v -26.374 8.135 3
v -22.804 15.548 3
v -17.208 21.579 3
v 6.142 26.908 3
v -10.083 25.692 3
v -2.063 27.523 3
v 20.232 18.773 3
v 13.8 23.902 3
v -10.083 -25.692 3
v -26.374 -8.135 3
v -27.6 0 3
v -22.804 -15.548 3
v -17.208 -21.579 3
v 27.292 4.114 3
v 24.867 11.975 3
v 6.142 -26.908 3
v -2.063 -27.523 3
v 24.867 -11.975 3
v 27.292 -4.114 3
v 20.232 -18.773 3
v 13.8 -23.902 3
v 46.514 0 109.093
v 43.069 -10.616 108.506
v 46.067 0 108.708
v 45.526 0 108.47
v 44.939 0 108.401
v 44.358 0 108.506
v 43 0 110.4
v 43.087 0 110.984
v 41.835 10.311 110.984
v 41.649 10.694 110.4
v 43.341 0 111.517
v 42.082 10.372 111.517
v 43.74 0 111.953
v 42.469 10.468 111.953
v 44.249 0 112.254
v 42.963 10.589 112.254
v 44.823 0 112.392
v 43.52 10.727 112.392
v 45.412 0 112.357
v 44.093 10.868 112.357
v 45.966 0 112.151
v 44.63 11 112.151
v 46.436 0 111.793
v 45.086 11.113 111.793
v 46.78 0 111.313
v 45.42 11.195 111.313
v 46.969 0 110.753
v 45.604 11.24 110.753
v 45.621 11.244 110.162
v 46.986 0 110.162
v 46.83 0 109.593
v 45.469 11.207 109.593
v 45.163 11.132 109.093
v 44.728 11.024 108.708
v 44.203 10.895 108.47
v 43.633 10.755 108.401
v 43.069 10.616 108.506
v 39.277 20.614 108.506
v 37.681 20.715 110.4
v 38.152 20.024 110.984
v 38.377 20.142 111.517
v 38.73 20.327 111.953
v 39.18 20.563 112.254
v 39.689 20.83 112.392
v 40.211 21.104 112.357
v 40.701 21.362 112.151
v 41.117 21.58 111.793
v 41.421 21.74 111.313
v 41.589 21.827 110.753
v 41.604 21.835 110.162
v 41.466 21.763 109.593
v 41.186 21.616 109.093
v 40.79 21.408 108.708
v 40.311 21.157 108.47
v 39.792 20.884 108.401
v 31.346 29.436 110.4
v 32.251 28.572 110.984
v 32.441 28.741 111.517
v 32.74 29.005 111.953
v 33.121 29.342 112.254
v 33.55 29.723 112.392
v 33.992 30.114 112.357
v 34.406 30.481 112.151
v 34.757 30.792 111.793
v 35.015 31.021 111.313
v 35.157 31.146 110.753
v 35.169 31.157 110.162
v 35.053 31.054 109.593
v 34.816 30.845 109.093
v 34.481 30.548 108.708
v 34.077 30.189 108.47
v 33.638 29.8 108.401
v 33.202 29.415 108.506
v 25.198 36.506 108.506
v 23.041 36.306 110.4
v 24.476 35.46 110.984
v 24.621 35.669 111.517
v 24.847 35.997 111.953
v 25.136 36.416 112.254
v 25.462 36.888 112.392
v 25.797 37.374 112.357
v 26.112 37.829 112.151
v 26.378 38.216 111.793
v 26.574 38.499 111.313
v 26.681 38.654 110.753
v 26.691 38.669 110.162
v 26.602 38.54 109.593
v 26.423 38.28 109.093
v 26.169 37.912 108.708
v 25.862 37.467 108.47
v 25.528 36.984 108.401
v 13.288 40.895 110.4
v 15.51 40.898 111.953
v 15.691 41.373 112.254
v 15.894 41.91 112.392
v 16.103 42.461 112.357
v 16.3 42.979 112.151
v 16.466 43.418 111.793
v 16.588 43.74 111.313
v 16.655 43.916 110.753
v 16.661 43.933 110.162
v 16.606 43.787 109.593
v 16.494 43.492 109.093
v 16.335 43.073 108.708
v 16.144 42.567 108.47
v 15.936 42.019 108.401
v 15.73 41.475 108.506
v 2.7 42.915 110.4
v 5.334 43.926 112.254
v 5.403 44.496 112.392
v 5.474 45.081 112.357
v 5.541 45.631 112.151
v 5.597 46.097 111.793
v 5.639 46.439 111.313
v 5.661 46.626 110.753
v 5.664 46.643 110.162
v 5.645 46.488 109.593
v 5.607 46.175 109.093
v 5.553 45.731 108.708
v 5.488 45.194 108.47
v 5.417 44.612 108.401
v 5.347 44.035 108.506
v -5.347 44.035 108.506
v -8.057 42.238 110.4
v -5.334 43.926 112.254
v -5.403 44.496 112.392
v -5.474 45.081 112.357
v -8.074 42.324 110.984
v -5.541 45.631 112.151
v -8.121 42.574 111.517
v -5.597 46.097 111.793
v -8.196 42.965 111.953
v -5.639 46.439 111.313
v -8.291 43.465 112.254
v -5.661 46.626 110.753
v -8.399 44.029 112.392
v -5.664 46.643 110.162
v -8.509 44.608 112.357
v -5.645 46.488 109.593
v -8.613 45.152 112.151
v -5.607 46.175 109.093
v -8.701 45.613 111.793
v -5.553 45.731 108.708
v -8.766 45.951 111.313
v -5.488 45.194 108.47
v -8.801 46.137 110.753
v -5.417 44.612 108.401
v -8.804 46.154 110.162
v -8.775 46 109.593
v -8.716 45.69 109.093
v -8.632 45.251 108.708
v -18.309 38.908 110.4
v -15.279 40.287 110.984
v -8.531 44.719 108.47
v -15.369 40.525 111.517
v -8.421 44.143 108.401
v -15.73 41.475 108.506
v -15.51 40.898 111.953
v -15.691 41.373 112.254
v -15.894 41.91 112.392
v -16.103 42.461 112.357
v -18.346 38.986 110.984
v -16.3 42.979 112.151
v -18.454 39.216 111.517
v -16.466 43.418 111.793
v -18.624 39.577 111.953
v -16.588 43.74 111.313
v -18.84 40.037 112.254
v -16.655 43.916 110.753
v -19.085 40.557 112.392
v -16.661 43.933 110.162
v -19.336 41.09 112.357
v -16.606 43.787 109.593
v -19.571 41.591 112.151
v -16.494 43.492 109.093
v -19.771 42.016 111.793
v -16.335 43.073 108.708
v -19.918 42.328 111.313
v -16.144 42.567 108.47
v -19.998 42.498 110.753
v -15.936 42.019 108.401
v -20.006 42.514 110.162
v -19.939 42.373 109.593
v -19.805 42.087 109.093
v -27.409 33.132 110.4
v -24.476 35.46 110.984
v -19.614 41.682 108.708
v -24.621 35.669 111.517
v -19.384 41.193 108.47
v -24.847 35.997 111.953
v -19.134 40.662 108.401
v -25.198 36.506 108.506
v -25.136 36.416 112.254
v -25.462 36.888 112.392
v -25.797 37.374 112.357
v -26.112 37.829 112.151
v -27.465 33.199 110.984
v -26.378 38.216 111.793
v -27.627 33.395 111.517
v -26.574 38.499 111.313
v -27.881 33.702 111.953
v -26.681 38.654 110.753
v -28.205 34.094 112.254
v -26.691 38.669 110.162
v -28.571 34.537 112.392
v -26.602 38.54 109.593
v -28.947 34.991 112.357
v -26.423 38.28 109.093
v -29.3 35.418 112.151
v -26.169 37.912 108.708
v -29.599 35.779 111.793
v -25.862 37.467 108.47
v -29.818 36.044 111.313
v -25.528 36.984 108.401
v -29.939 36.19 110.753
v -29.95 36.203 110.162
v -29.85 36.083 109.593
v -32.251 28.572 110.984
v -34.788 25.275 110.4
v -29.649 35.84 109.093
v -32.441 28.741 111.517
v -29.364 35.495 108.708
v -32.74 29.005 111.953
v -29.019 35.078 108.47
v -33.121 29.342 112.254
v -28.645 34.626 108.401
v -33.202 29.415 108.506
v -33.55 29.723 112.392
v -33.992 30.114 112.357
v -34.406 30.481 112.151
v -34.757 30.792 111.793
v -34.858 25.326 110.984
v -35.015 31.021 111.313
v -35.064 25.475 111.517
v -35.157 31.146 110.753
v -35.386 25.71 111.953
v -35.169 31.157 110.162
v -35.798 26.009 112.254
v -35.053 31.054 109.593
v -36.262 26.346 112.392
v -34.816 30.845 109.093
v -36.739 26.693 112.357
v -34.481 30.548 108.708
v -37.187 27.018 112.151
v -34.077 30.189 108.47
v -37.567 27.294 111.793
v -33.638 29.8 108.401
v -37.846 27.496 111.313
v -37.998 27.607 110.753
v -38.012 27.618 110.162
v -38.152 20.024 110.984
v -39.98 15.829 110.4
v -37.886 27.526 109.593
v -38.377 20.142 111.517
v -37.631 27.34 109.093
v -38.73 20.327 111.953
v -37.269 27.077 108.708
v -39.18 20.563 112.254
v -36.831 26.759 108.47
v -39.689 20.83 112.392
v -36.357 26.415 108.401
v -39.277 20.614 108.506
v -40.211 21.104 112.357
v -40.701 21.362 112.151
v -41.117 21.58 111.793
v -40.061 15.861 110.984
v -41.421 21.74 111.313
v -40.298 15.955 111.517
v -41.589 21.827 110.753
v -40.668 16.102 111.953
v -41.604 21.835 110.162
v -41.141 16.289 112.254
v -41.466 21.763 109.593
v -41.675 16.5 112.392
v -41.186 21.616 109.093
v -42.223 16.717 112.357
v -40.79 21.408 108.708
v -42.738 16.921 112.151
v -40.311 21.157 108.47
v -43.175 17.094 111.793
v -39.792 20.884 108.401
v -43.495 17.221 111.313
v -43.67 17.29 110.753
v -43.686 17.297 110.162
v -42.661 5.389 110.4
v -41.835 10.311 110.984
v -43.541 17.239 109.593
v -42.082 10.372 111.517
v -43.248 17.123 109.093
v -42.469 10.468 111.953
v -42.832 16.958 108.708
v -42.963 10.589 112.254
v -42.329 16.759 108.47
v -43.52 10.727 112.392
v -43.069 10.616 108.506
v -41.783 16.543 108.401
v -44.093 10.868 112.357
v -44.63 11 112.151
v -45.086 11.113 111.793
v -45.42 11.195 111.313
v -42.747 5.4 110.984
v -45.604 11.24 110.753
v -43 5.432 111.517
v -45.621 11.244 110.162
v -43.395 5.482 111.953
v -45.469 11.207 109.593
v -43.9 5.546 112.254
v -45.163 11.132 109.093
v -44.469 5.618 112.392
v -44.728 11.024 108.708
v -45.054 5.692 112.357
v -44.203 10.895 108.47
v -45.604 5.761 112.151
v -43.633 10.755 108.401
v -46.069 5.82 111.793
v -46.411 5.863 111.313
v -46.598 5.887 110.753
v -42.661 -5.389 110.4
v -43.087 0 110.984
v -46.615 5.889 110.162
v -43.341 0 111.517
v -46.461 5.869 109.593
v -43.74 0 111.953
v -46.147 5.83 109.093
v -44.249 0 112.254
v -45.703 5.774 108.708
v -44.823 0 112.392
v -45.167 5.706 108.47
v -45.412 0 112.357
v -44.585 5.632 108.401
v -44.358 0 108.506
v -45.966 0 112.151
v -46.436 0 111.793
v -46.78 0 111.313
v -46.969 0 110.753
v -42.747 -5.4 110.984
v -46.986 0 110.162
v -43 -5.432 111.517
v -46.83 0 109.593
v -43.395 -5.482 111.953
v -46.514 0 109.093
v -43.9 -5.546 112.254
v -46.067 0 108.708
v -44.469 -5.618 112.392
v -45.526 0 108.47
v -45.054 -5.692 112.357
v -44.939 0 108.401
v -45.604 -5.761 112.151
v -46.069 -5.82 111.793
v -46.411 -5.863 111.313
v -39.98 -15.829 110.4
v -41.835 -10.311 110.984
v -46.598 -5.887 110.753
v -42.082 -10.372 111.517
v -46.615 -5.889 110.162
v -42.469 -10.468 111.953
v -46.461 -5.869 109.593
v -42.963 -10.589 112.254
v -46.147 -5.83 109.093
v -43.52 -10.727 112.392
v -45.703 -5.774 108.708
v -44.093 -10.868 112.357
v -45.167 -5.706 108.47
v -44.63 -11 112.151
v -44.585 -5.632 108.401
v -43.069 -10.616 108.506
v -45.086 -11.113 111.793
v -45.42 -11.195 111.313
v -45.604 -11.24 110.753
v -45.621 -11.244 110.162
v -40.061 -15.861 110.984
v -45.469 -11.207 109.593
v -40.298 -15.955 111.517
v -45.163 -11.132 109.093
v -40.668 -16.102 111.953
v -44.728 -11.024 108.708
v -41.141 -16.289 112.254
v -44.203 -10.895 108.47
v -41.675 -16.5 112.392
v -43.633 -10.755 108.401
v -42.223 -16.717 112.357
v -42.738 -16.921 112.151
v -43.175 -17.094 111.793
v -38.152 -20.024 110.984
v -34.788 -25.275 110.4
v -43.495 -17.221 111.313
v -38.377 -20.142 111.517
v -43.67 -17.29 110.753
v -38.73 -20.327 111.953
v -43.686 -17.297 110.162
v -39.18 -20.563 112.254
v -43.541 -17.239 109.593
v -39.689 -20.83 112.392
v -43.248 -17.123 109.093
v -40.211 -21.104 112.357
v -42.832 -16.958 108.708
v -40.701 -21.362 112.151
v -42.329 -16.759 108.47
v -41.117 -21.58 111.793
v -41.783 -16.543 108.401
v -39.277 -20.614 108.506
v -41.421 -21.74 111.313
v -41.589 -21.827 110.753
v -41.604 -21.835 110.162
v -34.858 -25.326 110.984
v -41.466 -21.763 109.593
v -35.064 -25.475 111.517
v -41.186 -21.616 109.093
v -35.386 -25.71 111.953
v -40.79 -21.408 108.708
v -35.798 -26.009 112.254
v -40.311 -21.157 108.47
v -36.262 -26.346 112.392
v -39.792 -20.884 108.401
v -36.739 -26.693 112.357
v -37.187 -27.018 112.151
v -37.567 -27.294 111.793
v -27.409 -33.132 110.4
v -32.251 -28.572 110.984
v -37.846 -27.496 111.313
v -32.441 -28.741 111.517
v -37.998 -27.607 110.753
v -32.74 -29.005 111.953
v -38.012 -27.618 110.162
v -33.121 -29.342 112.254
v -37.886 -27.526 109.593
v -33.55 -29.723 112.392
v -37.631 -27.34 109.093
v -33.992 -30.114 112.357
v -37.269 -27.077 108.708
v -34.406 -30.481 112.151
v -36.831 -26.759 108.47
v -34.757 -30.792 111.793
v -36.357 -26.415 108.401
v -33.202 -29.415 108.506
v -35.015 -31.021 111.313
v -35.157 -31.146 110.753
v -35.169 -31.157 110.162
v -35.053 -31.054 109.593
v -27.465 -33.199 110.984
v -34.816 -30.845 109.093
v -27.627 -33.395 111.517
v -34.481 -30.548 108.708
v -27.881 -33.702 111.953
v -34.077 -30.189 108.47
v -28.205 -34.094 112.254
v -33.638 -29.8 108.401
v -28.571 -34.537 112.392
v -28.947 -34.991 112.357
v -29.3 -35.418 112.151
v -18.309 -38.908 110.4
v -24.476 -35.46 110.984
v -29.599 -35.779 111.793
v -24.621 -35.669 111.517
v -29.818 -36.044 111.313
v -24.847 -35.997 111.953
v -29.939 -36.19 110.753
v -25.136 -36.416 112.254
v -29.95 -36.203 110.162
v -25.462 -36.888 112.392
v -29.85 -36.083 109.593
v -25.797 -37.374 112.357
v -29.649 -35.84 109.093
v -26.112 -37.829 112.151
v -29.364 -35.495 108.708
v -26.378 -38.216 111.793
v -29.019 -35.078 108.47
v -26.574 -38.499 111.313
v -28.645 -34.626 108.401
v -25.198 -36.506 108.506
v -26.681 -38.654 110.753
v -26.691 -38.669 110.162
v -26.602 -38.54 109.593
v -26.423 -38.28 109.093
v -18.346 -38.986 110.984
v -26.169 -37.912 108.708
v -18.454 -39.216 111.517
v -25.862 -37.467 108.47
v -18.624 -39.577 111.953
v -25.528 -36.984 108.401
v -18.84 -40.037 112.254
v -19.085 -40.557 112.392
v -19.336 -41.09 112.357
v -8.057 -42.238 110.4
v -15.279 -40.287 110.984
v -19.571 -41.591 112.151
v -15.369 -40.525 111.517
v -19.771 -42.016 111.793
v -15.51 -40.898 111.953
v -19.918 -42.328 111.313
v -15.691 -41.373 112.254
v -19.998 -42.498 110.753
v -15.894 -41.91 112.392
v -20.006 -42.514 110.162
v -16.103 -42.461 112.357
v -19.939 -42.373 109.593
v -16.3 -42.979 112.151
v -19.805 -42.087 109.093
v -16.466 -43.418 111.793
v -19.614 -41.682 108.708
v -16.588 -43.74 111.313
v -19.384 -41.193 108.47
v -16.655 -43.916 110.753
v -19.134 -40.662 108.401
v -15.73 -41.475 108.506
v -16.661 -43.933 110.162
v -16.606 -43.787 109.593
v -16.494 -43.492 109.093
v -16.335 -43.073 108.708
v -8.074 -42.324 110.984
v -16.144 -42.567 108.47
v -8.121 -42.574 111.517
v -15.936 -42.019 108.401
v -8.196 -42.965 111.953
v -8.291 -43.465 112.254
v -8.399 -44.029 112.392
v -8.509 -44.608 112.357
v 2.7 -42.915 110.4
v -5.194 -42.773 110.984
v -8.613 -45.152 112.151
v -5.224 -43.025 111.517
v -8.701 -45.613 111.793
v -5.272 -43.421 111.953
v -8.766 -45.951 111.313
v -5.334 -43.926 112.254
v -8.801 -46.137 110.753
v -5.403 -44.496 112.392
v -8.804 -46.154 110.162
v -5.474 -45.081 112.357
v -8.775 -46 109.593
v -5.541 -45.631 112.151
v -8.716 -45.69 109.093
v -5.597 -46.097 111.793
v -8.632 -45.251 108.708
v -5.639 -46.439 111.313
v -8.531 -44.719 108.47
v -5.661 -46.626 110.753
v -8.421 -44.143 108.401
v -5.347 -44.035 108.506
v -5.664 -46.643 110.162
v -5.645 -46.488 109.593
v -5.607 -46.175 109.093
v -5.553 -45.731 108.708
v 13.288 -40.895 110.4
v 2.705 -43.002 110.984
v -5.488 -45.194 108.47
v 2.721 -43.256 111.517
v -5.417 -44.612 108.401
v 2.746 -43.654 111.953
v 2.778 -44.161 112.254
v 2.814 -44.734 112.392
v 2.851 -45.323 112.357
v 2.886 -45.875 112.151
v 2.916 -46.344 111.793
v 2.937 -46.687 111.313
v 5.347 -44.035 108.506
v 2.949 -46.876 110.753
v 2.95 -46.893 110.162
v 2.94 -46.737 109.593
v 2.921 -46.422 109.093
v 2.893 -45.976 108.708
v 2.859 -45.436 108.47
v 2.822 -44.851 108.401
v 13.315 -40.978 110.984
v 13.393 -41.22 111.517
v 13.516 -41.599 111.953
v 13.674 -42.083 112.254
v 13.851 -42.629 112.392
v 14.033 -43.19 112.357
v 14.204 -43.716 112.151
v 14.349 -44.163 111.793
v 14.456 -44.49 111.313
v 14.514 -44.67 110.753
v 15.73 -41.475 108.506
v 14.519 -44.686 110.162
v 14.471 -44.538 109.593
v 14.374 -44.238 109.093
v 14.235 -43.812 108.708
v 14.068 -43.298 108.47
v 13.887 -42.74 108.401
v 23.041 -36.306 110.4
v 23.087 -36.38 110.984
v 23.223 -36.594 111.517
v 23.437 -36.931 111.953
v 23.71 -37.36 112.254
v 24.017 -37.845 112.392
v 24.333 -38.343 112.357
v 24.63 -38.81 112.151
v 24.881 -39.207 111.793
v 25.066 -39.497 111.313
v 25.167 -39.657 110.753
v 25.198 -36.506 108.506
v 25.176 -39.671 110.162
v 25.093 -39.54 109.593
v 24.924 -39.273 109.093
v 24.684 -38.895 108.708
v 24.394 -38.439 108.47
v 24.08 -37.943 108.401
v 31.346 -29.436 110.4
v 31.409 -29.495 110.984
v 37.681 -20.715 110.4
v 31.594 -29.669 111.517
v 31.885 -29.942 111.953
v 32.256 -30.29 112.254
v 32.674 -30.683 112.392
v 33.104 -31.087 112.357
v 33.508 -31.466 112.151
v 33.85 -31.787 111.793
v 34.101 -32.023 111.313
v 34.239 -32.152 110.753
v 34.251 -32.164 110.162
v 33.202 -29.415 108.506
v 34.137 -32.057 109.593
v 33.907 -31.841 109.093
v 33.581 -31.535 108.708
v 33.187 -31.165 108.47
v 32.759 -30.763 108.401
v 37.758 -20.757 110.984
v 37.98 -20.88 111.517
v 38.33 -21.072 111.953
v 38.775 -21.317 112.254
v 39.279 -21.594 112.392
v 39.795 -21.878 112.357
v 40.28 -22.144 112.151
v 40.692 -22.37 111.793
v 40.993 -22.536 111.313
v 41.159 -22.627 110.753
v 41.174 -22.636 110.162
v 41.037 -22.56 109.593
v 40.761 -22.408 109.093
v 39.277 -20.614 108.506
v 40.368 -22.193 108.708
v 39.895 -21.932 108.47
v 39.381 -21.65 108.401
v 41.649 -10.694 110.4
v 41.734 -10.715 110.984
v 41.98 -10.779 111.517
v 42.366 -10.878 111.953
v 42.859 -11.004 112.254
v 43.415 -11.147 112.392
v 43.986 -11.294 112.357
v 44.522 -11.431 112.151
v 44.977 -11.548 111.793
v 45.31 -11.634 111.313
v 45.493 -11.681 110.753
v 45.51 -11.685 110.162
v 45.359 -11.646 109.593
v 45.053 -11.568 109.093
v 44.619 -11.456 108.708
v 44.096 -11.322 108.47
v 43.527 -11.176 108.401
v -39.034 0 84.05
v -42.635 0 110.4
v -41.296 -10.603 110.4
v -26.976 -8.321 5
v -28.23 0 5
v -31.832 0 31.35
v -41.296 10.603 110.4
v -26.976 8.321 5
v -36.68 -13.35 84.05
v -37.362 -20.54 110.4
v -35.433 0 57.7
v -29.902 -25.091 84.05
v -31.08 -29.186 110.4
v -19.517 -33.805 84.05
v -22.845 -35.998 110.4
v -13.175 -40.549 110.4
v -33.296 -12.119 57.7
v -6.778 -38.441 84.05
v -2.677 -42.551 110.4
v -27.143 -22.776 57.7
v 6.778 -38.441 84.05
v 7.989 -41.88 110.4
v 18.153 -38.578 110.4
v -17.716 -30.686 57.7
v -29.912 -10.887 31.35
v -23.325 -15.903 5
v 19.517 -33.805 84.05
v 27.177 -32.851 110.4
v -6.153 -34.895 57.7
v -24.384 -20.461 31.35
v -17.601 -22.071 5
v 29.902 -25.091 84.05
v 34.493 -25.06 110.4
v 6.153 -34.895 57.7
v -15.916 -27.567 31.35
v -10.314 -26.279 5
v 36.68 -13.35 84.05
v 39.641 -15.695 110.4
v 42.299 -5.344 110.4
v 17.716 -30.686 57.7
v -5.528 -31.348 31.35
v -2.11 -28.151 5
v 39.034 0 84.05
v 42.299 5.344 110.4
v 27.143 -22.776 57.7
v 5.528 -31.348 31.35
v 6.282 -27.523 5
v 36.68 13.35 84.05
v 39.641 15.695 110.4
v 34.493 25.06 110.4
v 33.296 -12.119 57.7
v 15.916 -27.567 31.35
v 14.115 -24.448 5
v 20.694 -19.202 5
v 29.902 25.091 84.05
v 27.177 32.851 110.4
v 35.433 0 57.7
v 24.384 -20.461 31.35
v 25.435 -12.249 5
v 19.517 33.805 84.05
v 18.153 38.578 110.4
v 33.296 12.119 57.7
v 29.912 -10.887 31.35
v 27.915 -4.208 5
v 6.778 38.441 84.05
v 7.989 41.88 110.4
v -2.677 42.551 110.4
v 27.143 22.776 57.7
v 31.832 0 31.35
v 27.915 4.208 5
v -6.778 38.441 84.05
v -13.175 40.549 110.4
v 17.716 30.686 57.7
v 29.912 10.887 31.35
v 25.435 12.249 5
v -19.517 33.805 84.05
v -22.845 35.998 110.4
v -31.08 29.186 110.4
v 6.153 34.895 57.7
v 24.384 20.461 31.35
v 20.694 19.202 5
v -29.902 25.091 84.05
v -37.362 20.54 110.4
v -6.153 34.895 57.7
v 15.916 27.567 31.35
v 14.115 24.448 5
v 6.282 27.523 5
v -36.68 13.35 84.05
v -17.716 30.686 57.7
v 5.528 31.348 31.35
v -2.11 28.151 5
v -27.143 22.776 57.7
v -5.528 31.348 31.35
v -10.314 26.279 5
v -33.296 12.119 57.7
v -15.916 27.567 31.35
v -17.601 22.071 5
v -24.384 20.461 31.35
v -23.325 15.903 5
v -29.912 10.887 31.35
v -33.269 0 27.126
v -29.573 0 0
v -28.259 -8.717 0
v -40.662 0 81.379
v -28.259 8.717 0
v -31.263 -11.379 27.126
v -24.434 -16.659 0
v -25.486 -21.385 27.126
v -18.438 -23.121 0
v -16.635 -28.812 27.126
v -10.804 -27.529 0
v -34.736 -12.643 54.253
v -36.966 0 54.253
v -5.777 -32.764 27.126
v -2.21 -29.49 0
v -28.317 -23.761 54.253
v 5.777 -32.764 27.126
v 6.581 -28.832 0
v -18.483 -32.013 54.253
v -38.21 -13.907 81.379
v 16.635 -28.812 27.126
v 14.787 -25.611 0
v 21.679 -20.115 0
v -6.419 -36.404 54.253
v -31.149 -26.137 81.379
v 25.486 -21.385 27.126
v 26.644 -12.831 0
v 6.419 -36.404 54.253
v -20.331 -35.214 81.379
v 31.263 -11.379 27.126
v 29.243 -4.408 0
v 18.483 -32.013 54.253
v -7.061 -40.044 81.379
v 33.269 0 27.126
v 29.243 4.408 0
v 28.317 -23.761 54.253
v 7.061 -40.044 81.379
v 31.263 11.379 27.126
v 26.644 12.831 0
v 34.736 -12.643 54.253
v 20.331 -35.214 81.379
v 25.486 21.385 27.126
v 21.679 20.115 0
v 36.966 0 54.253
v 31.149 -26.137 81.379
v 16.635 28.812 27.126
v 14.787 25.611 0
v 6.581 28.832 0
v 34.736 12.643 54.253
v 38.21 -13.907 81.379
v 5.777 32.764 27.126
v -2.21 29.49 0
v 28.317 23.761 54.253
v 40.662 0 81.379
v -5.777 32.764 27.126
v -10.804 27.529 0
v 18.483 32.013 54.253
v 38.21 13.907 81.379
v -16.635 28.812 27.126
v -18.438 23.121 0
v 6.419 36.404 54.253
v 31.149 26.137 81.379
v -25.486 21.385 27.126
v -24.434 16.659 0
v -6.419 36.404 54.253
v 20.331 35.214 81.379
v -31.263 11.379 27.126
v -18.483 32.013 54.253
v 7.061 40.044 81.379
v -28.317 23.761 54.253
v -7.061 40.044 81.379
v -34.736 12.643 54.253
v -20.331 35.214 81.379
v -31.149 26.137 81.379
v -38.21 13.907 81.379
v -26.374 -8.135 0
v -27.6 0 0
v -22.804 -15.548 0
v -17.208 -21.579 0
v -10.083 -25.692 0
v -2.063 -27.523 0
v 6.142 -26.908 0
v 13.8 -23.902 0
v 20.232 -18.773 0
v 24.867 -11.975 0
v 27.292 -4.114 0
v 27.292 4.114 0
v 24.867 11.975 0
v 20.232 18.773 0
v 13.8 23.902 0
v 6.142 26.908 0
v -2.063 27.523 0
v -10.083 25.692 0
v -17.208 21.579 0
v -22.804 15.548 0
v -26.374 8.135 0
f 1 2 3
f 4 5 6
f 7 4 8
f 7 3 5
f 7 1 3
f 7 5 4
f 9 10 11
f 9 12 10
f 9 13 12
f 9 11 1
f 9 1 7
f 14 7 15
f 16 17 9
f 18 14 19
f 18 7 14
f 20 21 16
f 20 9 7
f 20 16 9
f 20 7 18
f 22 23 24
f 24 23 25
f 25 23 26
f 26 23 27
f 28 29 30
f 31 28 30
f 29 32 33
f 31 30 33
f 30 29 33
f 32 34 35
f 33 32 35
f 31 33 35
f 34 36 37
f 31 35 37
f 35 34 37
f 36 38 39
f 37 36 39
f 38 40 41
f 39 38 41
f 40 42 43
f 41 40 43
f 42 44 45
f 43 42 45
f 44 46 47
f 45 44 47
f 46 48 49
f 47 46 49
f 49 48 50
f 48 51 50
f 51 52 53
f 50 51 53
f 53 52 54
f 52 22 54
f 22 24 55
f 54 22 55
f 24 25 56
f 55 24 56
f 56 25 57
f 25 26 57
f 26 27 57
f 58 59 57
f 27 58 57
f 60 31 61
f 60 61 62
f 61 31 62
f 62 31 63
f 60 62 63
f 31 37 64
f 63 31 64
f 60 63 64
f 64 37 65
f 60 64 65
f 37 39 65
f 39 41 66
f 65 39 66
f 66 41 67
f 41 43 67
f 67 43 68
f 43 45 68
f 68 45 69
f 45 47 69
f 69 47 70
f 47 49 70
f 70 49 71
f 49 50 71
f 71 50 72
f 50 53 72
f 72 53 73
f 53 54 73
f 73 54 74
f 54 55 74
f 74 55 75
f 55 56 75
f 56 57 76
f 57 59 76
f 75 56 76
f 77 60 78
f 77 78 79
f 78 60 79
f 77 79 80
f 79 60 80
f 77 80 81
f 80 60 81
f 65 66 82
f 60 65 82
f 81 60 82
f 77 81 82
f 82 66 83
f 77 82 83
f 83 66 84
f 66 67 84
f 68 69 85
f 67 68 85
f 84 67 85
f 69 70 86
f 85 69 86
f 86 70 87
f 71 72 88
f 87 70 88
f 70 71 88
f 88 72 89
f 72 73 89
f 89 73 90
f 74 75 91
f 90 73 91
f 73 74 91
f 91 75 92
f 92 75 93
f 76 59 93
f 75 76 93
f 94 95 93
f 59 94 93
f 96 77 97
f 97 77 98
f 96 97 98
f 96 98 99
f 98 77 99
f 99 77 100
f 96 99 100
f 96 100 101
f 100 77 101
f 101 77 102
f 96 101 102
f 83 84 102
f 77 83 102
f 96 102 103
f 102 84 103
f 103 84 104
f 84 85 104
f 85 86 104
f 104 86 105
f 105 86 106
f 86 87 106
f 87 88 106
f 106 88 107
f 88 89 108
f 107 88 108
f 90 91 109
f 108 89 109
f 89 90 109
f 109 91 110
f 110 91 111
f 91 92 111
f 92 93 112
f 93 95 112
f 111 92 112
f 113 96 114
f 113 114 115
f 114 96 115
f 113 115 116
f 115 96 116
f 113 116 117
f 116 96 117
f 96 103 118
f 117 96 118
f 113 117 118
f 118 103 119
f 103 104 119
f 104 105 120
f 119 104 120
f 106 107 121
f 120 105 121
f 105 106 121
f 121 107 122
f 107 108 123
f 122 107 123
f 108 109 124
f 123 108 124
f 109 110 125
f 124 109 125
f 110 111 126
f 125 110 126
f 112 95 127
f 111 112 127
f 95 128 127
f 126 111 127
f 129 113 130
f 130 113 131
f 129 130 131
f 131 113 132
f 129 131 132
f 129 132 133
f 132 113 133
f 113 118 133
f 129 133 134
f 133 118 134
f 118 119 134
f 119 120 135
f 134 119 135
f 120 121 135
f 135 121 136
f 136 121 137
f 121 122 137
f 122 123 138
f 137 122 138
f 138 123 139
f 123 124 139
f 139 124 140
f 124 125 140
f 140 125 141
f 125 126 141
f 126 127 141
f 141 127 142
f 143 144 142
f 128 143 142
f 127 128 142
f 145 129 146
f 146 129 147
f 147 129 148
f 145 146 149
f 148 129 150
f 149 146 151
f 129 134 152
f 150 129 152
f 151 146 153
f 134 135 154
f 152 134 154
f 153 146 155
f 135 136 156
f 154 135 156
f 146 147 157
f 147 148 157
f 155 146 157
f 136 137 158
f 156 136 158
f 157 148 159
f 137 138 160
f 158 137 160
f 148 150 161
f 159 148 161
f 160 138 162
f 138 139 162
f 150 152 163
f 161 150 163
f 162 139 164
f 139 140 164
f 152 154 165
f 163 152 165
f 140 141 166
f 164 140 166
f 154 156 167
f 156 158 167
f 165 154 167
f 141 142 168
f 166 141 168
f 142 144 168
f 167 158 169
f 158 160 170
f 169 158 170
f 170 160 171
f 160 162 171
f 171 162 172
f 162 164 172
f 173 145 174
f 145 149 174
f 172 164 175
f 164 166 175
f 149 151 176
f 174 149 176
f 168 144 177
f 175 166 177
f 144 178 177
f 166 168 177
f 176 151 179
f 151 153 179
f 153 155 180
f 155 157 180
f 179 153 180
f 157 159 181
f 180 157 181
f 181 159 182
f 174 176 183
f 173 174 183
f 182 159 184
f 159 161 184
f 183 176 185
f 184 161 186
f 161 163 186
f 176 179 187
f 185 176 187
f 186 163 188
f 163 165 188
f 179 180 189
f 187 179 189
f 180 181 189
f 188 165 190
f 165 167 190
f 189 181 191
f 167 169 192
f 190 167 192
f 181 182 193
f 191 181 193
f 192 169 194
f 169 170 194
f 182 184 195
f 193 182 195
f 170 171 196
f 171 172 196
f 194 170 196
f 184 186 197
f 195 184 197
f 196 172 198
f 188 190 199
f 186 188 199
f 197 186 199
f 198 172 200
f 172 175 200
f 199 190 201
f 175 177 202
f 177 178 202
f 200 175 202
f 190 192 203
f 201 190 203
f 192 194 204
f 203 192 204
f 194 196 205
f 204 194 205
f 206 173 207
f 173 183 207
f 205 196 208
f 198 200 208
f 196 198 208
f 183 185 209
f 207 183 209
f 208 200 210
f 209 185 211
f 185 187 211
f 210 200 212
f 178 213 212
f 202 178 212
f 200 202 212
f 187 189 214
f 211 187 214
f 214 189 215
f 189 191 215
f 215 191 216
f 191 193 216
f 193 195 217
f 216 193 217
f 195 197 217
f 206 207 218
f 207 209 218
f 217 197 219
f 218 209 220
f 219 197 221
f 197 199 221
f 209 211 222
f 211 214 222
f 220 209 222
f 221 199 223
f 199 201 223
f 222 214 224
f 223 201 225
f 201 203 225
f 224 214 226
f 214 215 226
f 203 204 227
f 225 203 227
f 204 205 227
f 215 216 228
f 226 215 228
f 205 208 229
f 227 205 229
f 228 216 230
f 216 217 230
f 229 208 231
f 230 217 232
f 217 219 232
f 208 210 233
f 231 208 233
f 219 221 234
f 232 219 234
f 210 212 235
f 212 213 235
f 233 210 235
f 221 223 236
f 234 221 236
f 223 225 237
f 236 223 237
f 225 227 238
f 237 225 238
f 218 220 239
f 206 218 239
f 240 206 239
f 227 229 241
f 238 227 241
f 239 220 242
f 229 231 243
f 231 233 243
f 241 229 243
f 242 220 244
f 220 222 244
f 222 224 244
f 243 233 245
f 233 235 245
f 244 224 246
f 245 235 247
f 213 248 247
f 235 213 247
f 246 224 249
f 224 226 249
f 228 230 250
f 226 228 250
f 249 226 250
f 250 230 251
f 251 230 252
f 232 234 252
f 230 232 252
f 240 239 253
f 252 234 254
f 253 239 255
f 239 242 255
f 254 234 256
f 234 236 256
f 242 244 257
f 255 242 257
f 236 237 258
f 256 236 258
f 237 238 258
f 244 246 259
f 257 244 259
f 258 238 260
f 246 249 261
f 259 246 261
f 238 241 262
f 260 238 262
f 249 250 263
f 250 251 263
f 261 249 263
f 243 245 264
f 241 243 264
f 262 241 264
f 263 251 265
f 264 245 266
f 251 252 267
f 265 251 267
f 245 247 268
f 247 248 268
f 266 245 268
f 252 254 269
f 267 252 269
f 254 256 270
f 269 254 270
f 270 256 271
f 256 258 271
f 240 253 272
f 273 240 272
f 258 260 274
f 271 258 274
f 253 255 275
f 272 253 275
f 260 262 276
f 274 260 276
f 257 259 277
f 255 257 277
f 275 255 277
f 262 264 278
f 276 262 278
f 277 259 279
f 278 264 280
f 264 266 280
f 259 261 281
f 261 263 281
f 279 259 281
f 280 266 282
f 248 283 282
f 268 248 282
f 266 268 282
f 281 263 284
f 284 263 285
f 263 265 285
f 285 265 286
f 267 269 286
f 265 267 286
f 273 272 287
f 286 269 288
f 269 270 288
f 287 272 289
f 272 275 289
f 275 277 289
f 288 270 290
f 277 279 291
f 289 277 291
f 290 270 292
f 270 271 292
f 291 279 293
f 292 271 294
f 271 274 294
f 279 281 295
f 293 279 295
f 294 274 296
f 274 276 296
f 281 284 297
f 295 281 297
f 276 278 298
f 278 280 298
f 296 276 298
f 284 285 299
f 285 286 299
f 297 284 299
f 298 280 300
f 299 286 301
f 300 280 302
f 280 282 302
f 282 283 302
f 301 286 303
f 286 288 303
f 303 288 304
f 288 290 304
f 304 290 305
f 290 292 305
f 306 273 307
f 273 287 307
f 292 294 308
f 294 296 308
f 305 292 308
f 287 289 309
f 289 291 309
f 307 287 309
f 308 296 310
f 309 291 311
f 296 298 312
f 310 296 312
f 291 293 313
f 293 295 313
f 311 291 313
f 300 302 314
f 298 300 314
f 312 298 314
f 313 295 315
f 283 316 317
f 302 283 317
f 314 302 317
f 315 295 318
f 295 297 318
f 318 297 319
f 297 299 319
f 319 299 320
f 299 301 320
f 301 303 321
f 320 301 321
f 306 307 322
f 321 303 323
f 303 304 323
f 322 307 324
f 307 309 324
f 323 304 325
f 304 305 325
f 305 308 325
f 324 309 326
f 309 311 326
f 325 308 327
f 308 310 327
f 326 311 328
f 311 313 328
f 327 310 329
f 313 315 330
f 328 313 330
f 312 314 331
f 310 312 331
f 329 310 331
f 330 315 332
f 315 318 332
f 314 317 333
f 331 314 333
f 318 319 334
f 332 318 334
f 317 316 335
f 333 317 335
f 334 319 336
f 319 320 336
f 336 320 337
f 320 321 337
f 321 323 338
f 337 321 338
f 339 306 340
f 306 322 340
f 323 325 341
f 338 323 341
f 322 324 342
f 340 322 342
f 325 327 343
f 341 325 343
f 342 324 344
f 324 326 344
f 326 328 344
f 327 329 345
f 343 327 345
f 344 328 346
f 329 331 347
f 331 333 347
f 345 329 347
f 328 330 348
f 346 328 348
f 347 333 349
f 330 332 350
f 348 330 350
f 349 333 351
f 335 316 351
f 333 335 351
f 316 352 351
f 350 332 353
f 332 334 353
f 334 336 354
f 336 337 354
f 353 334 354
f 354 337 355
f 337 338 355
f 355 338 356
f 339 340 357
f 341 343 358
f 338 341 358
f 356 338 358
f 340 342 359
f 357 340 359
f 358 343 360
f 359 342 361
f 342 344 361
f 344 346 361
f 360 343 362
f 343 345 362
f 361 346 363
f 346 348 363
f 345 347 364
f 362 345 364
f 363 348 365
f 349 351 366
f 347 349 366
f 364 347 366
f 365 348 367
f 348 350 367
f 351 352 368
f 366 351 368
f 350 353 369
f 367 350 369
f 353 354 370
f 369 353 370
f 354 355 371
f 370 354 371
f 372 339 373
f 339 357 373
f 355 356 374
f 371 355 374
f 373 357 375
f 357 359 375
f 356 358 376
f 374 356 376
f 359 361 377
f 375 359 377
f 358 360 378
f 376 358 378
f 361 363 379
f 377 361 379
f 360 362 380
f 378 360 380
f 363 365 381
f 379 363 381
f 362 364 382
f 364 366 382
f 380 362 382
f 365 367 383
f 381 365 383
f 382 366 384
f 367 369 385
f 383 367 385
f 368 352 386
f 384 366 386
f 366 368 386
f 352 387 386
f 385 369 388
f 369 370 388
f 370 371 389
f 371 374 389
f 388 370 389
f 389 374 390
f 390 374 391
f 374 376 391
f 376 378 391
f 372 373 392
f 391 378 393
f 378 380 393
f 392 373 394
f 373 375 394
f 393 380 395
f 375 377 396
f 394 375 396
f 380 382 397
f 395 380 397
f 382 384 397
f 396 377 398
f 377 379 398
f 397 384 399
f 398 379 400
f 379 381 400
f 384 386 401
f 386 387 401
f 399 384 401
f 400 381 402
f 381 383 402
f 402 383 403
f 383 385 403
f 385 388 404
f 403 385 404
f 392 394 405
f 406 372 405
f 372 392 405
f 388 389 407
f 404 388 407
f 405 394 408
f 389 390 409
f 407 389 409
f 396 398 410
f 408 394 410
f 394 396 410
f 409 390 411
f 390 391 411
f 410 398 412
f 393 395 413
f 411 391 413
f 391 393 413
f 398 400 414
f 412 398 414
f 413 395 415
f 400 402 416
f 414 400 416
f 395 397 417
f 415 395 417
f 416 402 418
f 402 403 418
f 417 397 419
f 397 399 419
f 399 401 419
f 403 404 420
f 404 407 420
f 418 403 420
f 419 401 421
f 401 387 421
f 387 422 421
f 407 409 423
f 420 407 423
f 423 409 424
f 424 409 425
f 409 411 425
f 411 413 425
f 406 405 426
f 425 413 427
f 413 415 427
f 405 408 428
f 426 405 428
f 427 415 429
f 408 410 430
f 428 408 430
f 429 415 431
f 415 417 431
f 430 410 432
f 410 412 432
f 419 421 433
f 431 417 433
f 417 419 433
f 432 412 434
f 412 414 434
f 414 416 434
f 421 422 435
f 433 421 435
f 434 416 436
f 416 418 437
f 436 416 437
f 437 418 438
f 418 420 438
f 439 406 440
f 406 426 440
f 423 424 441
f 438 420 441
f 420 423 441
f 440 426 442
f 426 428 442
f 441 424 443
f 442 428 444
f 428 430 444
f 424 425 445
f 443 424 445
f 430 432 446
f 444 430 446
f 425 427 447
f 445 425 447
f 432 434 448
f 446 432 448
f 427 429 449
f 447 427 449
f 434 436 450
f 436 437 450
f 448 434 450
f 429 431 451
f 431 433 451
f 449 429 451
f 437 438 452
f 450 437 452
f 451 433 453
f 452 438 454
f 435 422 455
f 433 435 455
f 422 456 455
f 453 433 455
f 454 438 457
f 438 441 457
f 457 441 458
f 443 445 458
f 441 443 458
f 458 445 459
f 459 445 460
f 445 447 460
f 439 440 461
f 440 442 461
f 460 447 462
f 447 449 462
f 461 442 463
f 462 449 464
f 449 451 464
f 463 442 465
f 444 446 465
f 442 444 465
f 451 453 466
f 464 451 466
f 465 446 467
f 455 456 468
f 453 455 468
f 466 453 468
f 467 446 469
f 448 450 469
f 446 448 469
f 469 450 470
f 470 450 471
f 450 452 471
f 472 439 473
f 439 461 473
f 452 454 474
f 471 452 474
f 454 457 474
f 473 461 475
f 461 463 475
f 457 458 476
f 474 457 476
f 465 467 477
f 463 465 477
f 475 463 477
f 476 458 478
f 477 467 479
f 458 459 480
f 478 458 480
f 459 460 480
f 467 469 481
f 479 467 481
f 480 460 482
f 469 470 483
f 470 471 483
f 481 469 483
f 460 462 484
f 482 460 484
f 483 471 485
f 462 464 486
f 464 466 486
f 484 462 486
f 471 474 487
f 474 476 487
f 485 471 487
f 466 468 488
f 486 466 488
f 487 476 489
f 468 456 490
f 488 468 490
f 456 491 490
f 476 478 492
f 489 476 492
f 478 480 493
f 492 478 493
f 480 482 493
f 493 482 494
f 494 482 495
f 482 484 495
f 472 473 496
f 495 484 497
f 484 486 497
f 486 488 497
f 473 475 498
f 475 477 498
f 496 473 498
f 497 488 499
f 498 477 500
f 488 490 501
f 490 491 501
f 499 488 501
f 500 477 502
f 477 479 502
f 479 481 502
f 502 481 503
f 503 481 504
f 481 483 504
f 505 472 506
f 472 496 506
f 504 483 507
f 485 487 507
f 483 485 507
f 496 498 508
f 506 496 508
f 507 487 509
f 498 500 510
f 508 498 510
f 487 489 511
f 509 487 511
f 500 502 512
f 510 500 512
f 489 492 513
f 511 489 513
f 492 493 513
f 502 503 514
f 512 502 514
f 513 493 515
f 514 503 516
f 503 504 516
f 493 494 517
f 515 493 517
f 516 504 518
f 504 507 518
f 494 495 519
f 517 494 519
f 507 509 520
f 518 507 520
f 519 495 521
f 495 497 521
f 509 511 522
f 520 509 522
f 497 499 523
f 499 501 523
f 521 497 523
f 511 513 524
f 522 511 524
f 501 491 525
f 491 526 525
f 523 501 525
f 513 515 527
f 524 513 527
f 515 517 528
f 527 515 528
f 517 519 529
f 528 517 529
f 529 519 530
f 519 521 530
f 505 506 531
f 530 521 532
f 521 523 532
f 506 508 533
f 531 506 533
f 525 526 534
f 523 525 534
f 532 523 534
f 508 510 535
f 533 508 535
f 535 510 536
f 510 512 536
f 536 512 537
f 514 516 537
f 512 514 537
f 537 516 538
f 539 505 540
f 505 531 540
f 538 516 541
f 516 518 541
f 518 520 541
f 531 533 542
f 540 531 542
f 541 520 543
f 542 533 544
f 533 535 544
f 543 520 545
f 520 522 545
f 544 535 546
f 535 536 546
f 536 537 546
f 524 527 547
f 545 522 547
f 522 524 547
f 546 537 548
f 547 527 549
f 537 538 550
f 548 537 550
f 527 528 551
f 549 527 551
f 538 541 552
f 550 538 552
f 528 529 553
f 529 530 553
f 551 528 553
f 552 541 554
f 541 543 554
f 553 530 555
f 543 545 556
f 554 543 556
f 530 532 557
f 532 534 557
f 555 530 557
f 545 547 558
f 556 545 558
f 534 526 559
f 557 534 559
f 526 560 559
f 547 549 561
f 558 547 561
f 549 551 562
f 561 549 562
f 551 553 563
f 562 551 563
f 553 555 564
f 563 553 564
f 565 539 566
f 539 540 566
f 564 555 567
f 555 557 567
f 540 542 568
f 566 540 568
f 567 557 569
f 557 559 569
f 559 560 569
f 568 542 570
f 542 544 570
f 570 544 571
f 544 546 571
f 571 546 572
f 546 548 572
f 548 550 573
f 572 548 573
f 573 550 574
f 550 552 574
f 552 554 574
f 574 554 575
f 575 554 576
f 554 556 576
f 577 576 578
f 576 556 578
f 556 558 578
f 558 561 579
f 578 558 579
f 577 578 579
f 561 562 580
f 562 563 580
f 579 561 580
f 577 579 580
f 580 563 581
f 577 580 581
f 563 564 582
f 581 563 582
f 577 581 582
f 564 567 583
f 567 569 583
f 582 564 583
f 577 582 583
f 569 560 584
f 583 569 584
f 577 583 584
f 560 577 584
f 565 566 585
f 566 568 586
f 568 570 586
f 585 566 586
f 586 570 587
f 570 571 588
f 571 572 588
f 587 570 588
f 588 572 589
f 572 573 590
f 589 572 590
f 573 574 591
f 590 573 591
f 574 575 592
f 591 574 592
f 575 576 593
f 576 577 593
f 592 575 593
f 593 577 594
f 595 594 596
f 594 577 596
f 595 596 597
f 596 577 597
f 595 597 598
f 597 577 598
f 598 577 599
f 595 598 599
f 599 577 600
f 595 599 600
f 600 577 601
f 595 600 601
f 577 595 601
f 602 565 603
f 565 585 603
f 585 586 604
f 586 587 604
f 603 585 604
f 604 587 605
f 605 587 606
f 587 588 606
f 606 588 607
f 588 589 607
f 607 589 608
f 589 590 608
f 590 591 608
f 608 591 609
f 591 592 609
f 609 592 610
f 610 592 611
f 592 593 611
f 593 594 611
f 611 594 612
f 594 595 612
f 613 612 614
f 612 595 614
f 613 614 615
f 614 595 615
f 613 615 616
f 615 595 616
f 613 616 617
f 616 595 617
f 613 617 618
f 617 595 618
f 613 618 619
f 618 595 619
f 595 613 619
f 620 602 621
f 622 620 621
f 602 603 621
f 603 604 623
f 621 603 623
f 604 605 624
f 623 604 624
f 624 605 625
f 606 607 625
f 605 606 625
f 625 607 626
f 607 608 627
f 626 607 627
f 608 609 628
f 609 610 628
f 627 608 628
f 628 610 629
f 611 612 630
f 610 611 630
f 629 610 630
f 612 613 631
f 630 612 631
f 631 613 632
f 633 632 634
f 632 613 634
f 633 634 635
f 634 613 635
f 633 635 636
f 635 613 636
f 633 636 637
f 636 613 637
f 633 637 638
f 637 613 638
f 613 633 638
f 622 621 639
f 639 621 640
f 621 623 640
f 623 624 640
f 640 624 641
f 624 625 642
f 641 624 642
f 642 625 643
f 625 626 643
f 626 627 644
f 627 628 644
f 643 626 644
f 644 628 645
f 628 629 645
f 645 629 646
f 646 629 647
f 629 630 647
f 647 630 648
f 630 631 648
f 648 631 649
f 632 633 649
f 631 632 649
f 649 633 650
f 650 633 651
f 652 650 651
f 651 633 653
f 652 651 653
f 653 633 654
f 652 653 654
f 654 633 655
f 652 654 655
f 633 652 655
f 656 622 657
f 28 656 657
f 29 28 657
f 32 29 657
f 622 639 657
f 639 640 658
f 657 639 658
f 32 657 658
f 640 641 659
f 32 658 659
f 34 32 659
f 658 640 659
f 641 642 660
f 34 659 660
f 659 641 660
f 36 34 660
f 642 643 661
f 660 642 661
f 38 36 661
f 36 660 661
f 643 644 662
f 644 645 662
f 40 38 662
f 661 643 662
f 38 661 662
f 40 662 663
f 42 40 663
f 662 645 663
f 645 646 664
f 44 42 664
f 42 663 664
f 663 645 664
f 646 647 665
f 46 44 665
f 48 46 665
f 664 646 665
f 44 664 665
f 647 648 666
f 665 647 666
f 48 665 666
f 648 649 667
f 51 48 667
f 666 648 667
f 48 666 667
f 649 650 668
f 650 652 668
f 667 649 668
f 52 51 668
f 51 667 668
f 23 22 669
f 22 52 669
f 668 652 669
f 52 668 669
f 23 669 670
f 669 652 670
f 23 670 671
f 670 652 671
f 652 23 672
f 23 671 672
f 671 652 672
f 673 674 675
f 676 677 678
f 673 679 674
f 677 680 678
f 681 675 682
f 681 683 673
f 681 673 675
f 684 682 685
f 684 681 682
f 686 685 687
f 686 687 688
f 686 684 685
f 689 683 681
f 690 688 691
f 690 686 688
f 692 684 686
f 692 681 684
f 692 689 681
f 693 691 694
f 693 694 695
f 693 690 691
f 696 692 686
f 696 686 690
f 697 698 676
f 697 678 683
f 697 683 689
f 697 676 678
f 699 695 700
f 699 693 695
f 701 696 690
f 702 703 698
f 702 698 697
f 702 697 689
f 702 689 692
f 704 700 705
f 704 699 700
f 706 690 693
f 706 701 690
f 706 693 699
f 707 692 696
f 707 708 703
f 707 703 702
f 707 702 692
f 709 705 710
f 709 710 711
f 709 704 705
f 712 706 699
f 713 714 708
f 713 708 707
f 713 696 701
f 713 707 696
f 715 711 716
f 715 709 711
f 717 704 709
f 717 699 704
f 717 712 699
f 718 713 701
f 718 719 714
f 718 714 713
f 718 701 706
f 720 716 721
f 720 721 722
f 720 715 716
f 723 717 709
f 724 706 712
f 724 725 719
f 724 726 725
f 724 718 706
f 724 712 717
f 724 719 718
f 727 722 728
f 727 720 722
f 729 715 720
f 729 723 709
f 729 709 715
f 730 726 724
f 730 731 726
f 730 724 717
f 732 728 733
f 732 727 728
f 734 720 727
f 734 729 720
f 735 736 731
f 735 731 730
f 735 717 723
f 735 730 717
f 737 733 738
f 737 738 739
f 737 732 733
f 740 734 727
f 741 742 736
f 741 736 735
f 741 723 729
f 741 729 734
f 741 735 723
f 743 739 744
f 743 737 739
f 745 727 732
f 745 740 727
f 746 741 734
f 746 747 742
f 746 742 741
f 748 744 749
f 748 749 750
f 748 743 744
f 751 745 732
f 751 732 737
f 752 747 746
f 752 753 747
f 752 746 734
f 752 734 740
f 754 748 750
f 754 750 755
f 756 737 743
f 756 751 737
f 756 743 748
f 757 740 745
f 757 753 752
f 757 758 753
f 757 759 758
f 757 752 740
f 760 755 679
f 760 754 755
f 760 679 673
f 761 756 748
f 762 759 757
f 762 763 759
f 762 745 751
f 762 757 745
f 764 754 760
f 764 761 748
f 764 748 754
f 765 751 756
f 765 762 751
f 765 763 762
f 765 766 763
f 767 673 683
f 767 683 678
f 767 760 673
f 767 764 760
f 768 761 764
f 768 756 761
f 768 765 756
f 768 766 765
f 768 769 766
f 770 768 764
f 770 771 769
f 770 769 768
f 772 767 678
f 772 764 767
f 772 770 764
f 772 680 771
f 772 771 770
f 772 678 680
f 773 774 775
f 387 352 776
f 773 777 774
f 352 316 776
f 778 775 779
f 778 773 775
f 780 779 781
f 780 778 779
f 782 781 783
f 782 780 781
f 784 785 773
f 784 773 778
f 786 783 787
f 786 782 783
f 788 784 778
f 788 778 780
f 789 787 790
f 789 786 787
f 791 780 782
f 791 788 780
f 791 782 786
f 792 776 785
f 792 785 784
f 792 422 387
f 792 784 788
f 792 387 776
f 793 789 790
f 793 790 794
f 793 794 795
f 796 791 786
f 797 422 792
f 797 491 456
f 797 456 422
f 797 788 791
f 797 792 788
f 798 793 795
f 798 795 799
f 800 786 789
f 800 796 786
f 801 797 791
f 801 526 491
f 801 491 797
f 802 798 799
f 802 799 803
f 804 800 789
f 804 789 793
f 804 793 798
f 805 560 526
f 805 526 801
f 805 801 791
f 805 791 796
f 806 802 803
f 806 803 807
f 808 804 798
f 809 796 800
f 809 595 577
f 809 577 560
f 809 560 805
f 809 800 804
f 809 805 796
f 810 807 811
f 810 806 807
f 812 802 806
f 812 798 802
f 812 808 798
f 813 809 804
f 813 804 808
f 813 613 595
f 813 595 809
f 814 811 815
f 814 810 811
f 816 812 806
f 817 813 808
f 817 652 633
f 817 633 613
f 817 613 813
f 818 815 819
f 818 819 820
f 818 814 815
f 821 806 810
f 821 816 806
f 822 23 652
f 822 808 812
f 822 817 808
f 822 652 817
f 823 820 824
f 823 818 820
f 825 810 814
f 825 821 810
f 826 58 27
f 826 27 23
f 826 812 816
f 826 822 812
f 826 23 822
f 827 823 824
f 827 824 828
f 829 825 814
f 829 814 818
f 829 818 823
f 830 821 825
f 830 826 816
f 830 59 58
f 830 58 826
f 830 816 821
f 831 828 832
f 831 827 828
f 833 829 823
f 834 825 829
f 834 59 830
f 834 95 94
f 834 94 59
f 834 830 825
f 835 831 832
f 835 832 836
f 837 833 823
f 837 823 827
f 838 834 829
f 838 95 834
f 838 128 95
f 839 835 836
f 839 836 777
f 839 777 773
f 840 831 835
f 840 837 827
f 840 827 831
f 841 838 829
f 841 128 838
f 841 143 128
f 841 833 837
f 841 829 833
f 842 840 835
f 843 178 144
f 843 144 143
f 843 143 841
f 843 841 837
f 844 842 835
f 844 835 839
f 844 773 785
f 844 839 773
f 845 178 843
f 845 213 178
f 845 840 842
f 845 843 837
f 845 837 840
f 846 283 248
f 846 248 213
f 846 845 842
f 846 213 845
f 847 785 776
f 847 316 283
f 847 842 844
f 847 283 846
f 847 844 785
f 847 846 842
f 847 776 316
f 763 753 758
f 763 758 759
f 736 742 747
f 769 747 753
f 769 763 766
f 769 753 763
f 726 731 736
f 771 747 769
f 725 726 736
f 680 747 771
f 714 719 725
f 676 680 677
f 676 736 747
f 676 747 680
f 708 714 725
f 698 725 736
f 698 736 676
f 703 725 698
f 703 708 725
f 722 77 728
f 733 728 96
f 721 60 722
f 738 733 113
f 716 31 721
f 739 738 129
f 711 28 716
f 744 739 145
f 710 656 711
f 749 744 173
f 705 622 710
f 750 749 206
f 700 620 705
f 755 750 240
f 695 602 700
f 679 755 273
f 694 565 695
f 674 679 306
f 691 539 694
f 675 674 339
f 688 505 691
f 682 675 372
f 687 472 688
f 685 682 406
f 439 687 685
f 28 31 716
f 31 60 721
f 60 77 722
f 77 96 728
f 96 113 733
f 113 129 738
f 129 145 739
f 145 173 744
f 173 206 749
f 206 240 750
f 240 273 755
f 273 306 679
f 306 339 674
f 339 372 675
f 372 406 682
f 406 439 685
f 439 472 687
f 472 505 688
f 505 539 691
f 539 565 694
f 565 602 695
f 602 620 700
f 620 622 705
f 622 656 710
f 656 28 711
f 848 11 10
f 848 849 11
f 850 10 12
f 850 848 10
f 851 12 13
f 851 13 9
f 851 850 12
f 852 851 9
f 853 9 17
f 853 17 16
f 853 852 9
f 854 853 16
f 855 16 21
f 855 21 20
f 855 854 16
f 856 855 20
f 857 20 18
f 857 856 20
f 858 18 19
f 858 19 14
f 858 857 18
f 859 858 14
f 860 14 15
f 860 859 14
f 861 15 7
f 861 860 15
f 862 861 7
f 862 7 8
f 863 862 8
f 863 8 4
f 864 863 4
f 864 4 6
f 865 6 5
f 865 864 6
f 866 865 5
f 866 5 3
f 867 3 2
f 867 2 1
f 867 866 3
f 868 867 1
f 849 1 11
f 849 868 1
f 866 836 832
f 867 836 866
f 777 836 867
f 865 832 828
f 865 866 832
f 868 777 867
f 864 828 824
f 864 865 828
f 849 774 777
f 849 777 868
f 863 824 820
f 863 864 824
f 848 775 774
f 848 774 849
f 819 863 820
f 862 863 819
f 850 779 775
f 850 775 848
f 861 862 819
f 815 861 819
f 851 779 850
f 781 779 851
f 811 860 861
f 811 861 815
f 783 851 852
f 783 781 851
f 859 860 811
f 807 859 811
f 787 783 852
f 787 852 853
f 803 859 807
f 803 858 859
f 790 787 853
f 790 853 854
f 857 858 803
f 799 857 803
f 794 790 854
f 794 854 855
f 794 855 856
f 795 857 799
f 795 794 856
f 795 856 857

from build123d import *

# Parameters (mm, degrees)
SKETCH2_R = 2


with BuildPart() as part:
    # Sketch1 → Cup (revolve)
    with BuildSketch(Plane(origin=(0, 0, 0), x_dir=(-1, 0, 0), z_dir=(0, 1, 0)), mode=Mode.PRIVATE) as cup_sk:
        Polygon((0, 3), (-27.6, 3), (-27.6, 0), (-29.573, 0), (-44.616104, 110.4), (-42.635368, 110.4), (-28.23035, 5), (0, 5), align=None)
    revolve(cup_sk.sketch.rotate(Axis((0, 0, -50), (0, 0, 1)), 180), axis=Axis((0, 0, -50), (0, 0, 1)))

    # Sketch2 → BeadRound (revolve)
    with BuildSketch(Plane(origin=(0, 0, 0), x_dir=(-1, 0, 0), z_dir=(0, 1, 0))):
        with Locations((-45, 110.4)):
            Circle(SKETCH2_R)
    revolve(axis=Axis((0, 0, -50), (0, 0, 1)))


solid = part.part
